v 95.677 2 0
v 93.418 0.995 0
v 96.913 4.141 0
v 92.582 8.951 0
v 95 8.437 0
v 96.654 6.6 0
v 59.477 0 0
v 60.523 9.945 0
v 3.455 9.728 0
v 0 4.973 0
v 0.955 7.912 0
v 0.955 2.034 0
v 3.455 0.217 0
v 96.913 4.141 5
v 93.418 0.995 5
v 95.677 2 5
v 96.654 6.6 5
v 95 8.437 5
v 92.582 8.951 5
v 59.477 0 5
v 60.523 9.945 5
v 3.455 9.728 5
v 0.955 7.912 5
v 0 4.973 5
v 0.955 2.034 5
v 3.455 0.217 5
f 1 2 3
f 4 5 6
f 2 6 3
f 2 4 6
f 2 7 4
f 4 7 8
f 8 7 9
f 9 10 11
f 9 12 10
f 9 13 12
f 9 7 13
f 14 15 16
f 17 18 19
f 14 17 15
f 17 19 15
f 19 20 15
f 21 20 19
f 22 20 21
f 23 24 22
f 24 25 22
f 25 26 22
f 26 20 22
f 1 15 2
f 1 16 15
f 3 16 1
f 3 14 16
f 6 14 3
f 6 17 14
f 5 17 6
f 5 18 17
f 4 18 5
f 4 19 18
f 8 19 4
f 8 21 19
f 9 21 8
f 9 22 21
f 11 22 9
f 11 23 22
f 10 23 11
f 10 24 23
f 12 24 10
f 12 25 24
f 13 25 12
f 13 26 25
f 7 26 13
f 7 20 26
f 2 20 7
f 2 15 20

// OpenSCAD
$fn = 32;

// ----------------------------------------------------------------------
// Lever arm: two bosses 10 and 10 mm, 55 mm between centres
// ----------------------------------------------------------------------

// --- parameters (mm) ---
profile_height = 5;       // extrusion height
profile_points = 13;      // points of the closed outline

profile = [[0, 4.973], [0.955, 2.034], [3.455, 0.217], [59.477, 0], [93.418, 0.995], [95.677, 2], [96.913, 4.141], [96.654, 6.6], [95, 8.437], [92.582, 8.951], [60.523, 9.945], [3.455, 9.728], [0.955, 7.912]];  // single closed polygon, 13 points, counter clockwise

// --- the one profile operation ---
linear_extrude(height = profile_height) polygon(points = profile);
